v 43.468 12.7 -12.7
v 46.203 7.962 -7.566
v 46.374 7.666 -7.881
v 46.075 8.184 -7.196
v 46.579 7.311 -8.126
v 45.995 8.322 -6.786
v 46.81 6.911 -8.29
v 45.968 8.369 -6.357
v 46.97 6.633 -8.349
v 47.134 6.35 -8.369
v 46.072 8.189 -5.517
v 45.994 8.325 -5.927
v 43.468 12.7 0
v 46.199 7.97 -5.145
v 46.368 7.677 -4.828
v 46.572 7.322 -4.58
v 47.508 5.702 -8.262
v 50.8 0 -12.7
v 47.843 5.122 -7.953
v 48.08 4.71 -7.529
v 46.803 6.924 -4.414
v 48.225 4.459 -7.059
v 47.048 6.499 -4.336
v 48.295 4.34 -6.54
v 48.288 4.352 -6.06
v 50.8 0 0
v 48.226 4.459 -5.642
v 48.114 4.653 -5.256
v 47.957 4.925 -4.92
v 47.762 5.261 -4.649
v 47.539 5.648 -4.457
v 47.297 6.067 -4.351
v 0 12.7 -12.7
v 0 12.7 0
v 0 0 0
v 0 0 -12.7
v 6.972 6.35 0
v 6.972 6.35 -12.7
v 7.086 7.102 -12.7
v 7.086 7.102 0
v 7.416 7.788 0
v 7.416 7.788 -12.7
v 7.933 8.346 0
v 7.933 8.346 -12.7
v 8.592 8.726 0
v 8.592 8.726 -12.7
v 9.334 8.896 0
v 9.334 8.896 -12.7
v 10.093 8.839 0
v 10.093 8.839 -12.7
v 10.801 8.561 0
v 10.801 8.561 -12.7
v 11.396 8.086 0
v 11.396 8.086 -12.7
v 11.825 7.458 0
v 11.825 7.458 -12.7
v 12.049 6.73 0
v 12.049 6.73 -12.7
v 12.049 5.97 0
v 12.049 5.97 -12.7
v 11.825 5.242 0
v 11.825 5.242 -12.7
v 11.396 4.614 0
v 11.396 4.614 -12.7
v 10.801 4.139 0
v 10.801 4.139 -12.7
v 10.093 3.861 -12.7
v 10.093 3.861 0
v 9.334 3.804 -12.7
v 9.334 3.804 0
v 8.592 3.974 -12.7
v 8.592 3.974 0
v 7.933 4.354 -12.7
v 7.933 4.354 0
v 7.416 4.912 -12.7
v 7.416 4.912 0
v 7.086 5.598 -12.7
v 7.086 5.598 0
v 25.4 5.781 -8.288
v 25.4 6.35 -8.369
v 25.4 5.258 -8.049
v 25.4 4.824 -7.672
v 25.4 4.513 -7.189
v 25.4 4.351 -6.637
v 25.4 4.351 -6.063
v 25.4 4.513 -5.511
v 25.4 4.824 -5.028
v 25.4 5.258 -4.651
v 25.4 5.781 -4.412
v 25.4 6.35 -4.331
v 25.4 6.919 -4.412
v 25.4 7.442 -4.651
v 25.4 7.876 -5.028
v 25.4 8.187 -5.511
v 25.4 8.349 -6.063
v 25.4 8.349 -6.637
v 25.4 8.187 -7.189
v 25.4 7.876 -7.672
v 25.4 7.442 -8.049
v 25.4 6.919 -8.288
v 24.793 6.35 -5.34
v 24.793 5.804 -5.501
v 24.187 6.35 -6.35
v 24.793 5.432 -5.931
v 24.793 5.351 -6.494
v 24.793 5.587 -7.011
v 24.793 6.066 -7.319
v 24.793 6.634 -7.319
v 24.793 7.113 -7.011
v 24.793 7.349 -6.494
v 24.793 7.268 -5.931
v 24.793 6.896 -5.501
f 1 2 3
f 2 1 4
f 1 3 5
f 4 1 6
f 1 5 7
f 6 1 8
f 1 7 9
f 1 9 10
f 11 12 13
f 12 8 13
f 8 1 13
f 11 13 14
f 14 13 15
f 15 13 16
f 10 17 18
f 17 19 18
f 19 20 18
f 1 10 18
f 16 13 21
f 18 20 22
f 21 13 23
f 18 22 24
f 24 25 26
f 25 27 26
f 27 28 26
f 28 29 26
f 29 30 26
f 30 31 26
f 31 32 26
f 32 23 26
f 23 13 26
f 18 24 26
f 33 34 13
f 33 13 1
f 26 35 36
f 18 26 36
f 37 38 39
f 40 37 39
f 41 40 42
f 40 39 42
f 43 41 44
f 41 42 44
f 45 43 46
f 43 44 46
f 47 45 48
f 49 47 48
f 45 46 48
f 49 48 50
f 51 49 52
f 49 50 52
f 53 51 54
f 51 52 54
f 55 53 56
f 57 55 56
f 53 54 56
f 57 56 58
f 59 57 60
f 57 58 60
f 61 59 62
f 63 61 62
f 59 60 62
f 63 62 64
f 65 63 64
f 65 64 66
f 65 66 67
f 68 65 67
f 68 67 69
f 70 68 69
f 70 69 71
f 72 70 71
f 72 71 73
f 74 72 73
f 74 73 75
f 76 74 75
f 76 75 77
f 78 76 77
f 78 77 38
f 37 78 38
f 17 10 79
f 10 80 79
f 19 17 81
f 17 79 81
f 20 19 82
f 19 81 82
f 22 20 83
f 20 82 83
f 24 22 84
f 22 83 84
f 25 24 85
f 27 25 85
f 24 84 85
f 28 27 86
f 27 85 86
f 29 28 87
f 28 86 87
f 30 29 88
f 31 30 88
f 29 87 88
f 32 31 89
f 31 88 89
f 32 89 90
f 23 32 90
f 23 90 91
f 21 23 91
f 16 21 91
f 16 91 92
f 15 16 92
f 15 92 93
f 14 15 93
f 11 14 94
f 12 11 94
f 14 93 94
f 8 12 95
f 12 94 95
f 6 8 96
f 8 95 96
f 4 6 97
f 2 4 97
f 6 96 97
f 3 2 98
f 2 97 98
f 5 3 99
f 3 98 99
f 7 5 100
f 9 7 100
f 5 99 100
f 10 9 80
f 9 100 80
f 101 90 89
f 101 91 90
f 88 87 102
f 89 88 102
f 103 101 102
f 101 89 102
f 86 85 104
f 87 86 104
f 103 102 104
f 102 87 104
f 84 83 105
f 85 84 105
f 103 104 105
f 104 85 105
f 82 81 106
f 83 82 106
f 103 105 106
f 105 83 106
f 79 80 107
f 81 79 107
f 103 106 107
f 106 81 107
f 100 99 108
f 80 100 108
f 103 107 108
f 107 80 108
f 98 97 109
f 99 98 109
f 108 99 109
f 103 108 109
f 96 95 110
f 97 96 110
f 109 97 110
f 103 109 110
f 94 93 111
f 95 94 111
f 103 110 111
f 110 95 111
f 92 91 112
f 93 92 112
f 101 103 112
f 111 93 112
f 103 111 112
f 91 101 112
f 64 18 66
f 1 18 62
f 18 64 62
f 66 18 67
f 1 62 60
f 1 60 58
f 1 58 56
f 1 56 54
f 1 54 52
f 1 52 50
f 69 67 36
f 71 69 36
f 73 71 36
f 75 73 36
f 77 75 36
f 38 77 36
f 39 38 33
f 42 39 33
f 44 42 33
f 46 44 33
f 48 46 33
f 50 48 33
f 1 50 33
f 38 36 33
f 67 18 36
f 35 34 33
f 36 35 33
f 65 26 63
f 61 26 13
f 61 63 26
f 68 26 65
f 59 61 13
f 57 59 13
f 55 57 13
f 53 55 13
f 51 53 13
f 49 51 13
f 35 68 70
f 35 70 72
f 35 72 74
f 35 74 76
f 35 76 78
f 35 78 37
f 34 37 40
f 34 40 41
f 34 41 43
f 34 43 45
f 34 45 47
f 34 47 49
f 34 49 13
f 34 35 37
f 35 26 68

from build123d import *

# Parameters (mm, degrees)
SKETCH1_W                  = 12.7
SKETCH1_H                  = 12.7
BOSS_EXTRUDE1_DEPTH        = 50.8
F_10_32_TAPPED_HOLE1_D     = 4.0386
F_10_32_TAPPED_HOLE1_DEPTH = 25.4
F_10_32_TAPPED_HOLE1_TIP   = 1.213317848
CUT_EXTRUDE1_DEPTH         = 13.7
F_10_CLEARANCE_HOLE1_D     = 5.1054


with BuildPart() as part:
    # Sketch1 → Boss-Extrude1 (new body)
    with BuildSketch(Plane(origin=(0, 0, 0), x_dir=(0, 0, -1), z_dir=(1, 0, 0))):
        with Locations((6.35, 6.35)):
            Rectangle(SKETCH1_W, SKETCH1_H)
    extrude(amount=BOSS_EXTRUDE1_DEPTH)

    # #10-32 Tapped Hole1
    with Locations(Plane(origin=(50.8, 6.35, -6.35), x_dir=(0, 0, 1), z_dir=(1, 0, 0))):
        with Locations((0, 0)):
            Hole(F_10_32_TAPPED_HOLE1_D / 2, depth=F_10_32_TAPPED_HOLE1_DEPTH)
            with Locations((0, 0, -(F_10_32_TAPPED_HOLE1_DEPTH + F_10_32_TAPPED_HOLE1_TIP / 2))):  # 118° drill point
                Cone(0, F_10_32_TAPPED_HOLE1_D / 2, F_10_32_TAPPED_HOLE1_TIP, mode=Mode.SUBTRACT)

    # Sketch3 → Cut-Extrude1 (cut, through all)
    with BuildSketch(Plane.XY):
        Polygon((43.467651581, 12.7), (50.8, 0), (50.8, 12.7), align=None)
    extrude(amount=-CUT_EXTRUDE1_DEPTH, mode=Mode.SUBTRACT)

    # #10 Clearance Hole1 (through all)
    with Locations(Plane(origin=(9.525, 6.35, 0), x_dir=(1, 0, 0), z_dir=(0, 0, 1))):
        with Locations((0, 0)):
            Hole(F_10_CLEARANCE_HOLE1_D / 2)


solid = part.part
